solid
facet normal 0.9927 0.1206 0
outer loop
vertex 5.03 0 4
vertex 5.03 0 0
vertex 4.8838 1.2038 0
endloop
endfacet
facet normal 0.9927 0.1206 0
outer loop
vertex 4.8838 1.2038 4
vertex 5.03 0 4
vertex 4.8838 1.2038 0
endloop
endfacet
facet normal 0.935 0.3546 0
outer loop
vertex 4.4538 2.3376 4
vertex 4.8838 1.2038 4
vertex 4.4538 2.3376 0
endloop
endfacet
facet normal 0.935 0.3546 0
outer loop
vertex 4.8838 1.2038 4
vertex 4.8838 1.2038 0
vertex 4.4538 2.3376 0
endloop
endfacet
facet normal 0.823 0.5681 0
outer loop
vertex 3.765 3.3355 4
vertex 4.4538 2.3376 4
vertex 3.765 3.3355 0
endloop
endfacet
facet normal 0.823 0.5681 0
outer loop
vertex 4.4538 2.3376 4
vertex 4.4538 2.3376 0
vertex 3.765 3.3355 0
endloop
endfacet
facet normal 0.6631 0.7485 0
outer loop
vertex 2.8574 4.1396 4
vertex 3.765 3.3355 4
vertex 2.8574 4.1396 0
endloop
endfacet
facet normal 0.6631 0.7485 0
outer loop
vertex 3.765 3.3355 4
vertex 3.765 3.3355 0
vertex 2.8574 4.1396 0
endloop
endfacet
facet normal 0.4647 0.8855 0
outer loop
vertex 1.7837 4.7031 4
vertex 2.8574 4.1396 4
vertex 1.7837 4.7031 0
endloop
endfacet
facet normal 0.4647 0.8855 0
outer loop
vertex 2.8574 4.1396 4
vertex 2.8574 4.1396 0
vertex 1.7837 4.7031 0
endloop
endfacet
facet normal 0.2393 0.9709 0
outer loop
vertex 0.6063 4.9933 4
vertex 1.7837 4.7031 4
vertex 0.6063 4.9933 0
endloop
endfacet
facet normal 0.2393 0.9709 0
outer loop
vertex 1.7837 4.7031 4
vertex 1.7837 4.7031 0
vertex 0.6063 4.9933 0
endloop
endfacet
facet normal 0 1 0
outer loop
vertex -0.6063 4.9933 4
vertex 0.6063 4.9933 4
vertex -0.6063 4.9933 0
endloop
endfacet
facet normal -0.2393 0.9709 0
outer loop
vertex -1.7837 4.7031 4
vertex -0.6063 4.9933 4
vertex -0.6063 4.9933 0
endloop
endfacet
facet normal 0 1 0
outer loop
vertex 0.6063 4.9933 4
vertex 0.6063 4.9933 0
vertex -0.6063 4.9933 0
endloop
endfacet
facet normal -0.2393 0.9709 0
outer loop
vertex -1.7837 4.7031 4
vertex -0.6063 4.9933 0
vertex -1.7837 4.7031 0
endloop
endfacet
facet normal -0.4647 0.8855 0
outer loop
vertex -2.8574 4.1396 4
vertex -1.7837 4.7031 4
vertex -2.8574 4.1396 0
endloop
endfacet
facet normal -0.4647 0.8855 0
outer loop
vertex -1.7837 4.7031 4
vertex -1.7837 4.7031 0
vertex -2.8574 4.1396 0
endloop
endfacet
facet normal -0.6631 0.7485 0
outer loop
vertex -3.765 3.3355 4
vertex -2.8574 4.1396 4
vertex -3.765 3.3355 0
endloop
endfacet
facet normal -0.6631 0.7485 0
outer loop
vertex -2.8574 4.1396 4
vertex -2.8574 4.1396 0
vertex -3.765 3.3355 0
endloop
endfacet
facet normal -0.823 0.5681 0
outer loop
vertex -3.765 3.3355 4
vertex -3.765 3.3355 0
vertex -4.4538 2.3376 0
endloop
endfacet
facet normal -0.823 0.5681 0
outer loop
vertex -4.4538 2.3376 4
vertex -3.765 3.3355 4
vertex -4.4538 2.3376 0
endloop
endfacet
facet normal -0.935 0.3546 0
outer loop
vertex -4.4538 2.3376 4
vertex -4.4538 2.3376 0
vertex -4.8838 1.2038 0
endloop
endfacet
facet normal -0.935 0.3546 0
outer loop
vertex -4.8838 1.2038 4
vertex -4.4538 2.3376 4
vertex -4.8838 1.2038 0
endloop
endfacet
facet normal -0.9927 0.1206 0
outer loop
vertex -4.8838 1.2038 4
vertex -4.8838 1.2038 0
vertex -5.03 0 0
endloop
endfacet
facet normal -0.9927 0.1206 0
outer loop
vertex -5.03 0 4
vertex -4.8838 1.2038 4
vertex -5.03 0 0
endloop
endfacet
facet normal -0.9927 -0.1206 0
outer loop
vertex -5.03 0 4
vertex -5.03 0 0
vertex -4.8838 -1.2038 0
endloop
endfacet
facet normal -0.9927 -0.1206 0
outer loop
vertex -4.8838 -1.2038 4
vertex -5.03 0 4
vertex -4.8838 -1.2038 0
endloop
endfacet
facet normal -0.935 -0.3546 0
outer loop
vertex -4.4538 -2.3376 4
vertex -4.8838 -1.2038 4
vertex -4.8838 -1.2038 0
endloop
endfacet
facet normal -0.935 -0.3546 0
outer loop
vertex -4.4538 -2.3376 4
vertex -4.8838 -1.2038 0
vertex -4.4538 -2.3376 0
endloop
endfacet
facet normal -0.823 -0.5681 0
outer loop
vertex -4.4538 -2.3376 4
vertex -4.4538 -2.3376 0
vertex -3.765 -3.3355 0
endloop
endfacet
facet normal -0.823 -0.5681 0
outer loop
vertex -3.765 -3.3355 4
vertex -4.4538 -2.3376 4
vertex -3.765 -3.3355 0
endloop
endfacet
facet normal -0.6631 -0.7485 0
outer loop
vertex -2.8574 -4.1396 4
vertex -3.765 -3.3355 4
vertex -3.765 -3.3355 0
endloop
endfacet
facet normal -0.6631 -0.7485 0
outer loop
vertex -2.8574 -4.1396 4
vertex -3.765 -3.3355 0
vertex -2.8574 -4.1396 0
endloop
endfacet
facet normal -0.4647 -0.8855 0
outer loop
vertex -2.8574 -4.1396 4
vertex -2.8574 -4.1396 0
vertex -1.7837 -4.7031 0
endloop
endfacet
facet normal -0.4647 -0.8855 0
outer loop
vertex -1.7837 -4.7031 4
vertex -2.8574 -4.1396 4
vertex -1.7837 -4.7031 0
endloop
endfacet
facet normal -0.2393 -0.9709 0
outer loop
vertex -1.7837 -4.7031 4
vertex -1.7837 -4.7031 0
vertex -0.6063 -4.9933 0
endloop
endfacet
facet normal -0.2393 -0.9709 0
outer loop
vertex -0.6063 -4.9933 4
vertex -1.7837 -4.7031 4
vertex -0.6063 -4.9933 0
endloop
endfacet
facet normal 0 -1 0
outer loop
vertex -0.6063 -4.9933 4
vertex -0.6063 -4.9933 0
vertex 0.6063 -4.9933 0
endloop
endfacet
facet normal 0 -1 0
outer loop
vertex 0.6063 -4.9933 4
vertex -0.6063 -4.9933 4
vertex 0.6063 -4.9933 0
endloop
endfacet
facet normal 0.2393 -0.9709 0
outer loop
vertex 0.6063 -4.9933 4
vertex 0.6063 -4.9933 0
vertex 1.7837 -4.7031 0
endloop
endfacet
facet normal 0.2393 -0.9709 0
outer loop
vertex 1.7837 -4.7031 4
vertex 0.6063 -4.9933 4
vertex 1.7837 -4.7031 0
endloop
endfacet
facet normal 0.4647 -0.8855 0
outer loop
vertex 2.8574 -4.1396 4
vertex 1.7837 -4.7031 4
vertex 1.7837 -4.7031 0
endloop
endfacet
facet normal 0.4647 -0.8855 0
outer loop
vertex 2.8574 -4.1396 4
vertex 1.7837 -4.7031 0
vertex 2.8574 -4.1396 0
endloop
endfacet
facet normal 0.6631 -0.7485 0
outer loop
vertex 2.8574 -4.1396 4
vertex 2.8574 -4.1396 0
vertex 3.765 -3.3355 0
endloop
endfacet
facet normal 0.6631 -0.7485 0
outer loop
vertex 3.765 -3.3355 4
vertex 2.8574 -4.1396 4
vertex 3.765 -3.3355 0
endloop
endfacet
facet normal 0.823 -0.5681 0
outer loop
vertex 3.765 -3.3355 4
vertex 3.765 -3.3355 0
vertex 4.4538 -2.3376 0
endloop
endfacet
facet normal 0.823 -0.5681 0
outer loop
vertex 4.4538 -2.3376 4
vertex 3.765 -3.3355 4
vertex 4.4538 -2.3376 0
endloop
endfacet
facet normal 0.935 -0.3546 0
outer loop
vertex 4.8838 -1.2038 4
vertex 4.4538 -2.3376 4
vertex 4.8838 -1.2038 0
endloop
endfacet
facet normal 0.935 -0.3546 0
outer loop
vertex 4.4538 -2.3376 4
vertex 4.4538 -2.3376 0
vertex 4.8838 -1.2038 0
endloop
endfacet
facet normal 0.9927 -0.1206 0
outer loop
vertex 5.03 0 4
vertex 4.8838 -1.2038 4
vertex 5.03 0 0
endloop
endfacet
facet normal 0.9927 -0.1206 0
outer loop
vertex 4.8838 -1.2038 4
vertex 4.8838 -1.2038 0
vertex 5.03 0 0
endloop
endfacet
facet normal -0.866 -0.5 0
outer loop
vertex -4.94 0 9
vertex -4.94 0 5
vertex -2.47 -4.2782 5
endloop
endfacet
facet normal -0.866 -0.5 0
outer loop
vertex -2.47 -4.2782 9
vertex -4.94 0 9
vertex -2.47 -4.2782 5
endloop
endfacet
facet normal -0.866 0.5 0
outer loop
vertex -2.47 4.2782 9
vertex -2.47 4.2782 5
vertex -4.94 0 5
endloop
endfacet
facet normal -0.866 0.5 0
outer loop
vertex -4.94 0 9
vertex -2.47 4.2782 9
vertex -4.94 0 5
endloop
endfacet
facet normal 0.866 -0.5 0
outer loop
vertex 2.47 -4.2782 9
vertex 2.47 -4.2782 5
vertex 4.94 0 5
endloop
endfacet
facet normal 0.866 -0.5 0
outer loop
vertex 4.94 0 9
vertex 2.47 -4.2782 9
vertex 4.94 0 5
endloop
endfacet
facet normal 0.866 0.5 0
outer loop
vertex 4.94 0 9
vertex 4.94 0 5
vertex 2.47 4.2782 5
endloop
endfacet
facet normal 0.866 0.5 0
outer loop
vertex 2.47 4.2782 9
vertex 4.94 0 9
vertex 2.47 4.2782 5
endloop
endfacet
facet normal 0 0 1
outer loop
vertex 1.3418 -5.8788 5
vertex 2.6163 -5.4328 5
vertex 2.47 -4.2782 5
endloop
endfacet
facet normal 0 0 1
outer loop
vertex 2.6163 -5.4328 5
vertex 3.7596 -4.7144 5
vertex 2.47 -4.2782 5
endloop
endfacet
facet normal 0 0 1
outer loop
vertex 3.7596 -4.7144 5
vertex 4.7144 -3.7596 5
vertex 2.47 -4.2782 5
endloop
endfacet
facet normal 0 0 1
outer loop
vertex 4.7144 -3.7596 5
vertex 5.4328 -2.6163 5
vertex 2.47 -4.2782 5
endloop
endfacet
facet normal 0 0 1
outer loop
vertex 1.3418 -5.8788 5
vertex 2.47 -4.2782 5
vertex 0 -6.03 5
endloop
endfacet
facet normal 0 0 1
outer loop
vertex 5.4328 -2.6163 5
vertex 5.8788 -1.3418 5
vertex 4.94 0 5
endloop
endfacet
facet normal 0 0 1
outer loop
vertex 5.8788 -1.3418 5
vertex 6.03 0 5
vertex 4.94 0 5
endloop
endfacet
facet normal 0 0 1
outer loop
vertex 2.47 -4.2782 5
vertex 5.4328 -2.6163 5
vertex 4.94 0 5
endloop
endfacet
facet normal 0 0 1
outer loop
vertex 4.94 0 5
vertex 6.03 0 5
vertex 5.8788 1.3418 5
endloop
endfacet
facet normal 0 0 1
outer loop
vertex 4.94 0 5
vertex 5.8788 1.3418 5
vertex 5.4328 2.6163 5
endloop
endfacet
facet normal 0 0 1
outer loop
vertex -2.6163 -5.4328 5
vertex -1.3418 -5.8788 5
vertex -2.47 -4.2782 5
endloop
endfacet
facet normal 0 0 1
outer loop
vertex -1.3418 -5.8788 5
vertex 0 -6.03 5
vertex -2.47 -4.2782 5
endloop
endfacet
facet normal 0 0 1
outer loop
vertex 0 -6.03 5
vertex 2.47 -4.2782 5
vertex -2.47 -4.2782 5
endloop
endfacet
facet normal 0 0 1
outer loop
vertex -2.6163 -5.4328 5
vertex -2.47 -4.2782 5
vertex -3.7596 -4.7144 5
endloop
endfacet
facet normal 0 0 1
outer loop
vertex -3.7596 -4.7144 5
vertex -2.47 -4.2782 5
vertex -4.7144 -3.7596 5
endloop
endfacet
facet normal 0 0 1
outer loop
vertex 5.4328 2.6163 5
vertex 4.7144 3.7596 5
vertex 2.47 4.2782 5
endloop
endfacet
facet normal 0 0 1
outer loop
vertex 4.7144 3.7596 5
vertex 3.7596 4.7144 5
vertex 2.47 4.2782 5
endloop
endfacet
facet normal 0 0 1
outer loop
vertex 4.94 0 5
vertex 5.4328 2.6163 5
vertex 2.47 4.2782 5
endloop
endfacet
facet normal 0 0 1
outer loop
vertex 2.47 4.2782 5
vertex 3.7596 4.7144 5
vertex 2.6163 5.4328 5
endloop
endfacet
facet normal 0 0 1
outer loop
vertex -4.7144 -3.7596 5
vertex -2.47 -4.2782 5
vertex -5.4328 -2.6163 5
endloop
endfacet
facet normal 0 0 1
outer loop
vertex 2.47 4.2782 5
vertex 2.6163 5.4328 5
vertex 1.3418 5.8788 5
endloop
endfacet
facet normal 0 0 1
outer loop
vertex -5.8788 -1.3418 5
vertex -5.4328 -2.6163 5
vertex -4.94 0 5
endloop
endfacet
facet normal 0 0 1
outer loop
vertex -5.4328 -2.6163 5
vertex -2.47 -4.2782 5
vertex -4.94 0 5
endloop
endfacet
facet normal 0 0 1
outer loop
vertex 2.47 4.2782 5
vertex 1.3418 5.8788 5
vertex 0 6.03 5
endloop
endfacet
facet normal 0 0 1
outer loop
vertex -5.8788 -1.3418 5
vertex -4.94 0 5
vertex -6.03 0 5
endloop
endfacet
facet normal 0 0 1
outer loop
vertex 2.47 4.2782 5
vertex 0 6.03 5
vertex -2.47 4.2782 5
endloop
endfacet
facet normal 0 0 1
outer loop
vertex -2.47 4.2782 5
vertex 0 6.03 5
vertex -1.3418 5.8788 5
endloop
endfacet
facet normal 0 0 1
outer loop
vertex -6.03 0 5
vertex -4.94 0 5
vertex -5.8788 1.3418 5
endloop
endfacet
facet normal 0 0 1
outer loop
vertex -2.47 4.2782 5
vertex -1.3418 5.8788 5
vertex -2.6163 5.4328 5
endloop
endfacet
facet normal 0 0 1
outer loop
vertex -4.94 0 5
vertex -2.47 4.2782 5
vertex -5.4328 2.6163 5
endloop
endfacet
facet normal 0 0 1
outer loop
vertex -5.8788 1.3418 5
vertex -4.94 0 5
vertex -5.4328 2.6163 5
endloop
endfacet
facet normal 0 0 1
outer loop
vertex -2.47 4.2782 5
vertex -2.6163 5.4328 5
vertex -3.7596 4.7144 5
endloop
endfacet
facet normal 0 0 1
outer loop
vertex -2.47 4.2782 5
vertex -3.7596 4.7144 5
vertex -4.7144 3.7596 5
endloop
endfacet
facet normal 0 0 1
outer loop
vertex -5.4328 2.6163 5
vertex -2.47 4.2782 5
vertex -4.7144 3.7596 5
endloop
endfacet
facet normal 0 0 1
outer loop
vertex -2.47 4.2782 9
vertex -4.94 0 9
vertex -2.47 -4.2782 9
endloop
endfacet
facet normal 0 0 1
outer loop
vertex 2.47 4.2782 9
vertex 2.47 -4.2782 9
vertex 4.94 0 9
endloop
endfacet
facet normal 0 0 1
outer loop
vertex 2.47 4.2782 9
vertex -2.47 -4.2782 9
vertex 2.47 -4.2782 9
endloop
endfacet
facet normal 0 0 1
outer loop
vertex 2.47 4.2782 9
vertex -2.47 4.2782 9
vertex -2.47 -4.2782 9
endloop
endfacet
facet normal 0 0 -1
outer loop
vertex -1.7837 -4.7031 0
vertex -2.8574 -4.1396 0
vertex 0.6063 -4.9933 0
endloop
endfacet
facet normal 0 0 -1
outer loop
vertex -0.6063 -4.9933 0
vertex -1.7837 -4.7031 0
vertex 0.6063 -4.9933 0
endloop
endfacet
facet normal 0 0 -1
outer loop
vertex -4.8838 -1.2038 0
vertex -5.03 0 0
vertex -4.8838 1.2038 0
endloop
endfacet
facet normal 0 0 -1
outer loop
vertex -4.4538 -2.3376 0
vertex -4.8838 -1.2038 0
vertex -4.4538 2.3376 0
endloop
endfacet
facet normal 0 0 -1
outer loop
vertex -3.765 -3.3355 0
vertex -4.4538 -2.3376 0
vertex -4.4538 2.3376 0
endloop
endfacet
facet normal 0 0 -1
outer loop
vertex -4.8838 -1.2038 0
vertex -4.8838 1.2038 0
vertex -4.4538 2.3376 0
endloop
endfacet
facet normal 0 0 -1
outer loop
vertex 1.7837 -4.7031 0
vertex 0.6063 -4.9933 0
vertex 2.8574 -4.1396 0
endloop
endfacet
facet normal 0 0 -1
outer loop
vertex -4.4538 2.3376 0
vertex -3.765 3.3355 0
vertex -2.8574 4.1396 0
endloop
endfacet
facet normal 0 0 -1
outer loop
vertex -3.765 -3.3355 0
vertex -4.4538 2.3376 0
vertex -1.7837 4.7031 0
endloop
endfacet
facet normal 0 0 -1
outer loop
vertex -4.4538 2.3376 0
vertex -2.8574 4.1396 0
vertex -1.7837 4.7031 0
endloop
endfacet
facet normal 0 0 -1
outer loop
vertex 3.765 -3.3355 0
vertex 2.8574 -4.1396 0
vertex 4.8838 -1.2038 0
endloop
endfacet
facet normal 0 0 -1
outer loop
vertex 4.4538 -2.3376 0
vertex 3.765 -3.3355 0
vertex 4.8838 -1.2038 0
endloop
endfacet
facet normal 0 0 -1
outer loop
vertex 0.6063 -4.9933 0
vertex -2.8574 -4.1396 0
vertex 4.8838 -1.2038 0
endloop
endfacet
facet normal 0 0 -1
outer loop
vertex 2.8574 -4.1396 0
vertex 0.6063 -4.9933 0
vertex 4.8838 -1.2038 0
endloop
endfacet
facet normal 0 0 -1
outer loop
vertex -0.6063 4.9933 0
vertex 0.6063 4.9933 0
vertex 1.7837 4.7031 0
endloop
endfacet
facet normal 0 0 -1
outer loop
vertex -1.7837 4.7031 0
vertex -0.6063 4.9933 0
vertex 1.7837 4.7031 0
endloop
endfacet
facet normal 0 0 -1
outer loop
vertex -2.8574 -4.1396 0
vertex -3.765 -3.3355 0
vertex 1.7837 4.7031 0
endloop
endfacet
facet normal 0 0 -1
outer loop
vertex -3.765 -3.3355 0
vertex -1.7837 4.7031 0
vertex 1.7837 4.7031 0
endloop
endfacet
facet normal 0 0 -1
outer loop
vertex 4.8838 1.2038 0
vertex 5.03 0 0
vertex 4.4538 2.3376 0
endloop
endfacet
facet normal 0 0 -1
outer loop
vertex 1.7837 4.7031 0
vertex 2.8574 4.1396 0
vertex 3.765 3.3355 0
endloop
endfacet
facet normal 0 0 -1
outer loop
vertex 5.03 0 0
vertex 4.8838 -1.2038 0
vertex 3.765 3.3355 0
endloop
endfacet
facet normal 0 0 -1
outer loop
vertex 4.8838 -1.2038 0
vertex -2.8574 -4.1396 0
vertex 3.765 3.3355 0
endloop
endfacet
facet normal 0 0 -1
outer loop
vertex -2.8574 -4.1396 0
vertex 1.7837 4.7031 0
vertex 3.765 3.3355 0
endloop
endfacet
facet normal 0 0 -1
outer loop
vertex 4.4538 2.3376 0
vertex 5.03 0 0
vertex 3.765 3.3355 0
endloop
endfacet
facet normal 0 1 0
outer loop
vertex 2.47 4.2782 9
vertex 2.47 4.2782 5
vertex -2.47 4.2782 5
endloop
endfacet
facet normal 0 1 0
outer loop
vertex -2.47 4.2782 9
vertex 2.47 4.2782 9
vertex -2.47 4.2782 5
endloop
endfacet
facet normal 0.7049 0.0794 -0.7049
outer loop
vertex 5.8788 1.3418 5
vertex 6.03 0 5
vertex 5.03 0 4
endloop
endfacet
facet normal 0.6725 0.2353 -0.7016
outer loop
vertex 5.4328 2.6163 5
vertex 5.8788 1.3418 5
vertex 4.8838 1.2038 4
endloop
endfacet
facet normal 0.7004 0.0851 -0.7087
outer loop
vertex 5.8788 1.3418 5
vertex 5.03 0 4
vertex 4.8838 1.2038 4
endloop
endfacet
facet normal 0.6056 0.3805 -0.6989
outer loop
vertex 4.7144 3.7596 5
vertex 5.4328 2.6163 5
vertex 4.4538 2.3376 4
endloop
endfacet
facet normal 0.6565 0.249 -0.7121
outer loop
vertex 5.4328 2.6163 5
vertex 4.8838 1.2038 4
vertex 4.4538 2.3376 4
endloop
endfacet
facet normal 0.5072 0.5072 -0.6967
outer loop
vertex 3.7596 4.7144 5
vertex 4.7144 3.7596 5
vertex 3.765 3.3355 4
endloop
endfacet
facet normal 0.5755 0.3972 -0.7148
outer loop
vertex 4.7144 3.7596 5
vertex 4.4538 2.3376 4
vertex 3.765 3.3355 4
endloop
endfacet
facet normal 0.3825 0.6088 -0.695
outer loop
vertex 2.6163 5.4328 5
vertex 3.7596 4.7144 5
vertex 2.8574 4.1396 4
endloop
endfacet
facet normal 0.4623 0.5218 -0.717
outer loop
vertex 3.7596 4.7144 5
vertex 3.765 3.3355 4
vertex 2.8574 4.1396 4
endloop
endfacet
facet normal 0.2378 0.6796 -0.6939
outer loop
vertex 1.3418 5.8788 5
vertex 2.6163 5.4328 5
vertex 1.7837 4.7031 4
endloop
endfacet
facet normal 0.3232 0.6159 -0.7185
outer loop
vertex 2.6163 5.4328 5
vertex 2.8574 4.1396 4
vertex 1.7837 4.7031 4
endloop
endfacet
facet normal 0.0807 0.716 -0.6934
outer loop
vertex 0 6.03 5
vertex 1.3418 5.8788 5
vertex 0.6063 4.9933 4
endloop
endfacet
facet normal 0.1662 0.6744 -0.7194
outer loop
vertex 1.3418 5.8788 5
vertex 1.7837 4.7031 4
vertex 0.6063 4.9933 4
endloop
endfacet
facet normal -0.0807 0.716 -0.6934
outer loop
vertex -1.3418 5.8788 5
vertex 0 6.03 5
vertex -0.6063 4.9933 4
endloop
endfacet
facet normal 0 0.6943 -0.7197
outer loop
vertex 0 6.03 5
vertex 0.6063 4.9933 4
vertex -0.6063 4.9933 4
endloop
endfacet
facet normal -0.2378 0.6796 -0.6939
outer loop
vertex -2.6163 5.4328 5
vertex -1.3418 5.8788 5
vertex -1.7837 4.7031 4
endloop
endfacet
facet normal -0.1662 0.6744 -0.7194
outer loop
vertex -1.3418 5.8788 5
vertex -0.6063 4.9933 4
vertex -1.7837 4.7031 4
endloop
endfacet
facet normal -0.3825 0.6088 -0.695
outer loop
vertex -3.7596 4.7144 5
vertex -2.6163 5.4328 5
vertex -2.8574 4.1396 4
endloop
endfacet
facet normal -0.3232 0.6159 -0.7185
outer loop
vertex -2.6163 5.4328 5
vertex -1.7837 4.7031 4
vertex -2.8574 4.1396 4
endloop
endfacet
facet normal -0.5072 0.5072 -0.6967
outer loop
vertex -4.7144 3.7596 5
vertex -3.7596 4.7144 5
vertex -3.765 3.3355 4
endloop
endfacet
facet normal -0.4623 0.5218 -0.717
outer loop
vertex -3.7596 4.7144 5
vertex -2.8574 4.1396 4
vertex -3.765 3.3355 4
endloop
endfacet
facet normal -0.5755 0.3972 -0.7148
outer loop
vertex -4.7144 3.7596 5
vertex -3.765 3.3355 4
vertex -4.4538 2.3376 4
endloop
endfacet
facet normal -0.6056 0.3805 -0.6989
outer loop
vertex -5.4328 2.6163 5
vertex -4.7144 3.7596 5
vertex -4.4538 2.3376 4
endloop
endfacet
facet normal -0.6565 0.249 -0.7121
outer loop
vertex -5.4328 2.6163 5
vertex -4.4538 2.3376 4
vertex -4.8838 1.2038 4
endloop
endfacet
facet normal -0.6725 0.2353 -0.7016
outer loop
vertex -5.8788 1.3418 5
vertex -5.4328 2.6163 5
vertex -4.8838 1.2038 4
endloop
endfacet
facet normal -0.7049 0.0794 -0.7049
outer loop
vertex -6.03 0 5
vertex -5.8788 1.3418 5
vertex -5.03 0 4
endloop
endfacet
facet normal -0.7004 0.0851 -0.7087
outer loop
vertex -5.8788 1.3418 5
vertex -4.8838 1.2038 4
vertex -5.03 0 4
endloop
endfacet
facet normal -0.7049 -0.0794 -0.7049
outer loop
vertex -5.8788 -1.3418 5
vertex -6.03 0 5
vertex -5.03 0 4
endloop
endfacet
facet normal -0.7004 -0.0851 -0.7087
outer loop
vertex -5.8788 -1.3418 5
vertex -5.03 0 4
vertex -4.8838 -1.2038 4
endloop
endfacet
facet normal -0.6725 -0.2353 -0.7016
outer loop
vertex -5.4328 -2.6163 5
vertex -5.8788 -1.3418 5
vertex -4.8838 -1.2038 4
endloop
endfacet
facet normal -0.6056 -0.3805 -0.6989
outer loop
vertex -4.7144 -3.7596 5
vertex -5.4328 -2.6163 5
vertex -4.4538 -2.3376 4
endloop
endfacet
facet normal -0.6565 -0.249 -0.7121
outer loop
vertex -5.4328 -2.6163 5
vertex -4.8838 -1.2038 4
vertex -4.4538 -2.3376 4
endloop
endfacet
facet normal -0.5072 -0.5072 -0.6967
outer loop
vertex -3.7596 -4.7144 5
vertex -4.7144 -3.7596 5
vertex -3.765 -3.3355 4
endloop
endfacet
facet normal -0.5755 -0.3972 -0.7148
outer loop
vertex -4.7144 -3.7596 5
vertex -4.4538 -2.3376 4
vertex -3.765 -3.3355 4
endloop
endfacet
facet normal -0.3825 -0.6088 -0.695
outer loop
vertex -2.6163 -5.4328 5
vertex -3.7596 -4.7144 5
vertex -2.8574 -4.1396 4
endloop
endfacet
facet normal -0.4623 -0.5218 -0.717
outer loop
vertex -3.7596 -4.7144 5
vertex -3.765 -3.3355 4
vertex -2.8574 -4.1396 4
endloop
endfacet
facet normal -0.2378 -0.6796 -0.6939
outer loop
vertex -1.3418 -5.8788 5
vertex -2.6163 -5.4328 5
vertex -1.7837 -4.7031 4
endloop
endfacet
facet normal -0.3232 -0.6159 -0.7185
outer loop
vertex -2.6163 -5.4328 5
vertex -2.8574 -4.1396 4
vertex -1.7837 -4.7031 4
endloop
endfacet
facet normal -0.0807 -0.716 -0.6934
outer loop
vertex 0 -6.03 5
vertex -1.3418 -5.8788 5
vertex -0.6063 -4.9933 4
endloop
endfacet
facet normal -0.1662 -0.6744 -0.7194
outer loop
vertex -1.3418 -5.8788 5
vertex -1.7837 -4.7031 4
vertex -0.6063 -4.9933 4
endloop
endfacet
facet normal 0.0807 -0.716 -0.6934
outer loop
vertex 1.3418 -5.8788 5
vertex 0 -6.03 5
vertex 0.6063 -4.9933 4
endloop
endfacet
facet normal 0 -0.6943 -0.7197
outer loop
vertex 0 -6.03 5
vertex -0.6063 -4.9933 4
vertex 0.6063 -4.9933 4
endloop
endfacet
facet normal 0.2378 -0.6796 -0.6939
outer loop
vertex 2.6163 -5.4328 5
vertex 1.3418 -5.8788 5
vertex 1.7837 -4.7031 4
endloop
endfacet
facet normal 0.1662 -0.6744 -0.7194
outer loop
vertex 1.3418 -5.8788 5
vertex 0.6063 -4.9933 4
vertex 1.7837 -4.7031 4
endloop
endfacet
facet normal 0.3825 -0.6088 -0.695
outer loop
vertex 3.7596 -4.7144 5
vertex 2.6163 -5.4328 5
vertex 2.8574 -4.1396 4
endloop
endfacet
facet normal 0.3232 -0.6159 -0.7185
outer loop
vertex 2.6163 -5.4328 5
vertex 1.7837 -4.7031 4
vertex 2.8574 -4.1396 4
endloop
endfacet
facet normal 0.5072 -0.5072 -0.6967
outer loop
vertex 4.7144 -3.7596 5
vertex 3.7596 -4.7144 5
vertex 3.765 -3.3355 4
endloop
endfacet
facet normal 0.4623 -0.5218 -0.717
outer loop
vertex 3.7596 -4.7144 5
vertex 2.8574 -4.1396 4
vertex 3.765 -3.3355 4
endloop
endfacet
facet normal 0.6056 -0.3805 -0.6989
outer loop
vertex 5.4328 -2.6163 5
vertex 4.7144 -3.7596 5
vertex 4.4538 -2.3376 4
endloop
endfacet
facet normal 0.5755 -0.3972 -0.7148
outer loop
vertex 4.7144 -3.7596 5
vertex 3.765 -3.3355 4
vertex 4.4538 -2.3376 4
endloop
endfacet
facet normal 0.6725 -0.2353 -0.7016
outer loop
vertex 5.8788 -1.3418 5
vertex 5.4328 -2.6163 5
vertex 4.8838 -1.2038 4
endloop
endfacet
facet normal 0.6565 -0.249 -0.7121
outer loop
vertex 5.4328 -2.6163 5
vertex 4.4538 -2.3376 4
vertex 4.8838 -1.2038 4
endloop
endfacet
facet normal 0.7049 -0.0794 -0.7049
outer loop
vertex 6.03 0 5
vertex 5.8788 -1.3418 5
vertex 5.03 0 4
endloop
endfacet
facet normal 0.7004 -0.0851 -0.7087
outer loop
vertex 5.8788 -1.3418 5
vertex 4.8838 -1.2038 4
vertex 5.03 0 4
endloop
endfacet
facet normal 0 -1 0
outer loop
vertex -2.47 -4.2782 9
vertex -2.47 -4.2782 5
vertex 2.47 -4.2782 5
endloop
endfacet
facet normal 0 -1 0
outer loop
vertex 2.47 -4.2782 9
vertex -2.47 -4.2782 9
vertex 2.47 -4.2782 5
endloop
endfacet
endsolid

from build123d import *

# Parameters (mm, degrees)
SKETCH007_R  = 5.03
PAD005_DEPTH = 5
PAD006_DEPTH = 4


with BuildPart() as part:
    # Sketch007 → Pad005 (new body)
    with BuildSketch(Plane.XY):
        Circle(SKETCH007_R)
    extrude(amount=PAD005_DEPTH)

    # Sketch008 → Pad006 (join)
    with BuildSketch(Plane.XY.offset(5)):
        Polygon((2.47, -4.278165), (4.94, 0), (2.47, 4.278165), (-2.47, 4.278165), (-4.94, 0), (-2.47, -4.278165), align=None)
    extrude(amount=PAD006_DEPTH)

    # Sketch009 → Revolution001 (revolve)
    with BuildSketch(Plane.XZ):
        Polygon((5.03, 5), (6.03, 5), (5.03, 4), align=None)
    revolve(axis=Axis((0, 0, 0), (0, 0, 1)))


solid = part.part
